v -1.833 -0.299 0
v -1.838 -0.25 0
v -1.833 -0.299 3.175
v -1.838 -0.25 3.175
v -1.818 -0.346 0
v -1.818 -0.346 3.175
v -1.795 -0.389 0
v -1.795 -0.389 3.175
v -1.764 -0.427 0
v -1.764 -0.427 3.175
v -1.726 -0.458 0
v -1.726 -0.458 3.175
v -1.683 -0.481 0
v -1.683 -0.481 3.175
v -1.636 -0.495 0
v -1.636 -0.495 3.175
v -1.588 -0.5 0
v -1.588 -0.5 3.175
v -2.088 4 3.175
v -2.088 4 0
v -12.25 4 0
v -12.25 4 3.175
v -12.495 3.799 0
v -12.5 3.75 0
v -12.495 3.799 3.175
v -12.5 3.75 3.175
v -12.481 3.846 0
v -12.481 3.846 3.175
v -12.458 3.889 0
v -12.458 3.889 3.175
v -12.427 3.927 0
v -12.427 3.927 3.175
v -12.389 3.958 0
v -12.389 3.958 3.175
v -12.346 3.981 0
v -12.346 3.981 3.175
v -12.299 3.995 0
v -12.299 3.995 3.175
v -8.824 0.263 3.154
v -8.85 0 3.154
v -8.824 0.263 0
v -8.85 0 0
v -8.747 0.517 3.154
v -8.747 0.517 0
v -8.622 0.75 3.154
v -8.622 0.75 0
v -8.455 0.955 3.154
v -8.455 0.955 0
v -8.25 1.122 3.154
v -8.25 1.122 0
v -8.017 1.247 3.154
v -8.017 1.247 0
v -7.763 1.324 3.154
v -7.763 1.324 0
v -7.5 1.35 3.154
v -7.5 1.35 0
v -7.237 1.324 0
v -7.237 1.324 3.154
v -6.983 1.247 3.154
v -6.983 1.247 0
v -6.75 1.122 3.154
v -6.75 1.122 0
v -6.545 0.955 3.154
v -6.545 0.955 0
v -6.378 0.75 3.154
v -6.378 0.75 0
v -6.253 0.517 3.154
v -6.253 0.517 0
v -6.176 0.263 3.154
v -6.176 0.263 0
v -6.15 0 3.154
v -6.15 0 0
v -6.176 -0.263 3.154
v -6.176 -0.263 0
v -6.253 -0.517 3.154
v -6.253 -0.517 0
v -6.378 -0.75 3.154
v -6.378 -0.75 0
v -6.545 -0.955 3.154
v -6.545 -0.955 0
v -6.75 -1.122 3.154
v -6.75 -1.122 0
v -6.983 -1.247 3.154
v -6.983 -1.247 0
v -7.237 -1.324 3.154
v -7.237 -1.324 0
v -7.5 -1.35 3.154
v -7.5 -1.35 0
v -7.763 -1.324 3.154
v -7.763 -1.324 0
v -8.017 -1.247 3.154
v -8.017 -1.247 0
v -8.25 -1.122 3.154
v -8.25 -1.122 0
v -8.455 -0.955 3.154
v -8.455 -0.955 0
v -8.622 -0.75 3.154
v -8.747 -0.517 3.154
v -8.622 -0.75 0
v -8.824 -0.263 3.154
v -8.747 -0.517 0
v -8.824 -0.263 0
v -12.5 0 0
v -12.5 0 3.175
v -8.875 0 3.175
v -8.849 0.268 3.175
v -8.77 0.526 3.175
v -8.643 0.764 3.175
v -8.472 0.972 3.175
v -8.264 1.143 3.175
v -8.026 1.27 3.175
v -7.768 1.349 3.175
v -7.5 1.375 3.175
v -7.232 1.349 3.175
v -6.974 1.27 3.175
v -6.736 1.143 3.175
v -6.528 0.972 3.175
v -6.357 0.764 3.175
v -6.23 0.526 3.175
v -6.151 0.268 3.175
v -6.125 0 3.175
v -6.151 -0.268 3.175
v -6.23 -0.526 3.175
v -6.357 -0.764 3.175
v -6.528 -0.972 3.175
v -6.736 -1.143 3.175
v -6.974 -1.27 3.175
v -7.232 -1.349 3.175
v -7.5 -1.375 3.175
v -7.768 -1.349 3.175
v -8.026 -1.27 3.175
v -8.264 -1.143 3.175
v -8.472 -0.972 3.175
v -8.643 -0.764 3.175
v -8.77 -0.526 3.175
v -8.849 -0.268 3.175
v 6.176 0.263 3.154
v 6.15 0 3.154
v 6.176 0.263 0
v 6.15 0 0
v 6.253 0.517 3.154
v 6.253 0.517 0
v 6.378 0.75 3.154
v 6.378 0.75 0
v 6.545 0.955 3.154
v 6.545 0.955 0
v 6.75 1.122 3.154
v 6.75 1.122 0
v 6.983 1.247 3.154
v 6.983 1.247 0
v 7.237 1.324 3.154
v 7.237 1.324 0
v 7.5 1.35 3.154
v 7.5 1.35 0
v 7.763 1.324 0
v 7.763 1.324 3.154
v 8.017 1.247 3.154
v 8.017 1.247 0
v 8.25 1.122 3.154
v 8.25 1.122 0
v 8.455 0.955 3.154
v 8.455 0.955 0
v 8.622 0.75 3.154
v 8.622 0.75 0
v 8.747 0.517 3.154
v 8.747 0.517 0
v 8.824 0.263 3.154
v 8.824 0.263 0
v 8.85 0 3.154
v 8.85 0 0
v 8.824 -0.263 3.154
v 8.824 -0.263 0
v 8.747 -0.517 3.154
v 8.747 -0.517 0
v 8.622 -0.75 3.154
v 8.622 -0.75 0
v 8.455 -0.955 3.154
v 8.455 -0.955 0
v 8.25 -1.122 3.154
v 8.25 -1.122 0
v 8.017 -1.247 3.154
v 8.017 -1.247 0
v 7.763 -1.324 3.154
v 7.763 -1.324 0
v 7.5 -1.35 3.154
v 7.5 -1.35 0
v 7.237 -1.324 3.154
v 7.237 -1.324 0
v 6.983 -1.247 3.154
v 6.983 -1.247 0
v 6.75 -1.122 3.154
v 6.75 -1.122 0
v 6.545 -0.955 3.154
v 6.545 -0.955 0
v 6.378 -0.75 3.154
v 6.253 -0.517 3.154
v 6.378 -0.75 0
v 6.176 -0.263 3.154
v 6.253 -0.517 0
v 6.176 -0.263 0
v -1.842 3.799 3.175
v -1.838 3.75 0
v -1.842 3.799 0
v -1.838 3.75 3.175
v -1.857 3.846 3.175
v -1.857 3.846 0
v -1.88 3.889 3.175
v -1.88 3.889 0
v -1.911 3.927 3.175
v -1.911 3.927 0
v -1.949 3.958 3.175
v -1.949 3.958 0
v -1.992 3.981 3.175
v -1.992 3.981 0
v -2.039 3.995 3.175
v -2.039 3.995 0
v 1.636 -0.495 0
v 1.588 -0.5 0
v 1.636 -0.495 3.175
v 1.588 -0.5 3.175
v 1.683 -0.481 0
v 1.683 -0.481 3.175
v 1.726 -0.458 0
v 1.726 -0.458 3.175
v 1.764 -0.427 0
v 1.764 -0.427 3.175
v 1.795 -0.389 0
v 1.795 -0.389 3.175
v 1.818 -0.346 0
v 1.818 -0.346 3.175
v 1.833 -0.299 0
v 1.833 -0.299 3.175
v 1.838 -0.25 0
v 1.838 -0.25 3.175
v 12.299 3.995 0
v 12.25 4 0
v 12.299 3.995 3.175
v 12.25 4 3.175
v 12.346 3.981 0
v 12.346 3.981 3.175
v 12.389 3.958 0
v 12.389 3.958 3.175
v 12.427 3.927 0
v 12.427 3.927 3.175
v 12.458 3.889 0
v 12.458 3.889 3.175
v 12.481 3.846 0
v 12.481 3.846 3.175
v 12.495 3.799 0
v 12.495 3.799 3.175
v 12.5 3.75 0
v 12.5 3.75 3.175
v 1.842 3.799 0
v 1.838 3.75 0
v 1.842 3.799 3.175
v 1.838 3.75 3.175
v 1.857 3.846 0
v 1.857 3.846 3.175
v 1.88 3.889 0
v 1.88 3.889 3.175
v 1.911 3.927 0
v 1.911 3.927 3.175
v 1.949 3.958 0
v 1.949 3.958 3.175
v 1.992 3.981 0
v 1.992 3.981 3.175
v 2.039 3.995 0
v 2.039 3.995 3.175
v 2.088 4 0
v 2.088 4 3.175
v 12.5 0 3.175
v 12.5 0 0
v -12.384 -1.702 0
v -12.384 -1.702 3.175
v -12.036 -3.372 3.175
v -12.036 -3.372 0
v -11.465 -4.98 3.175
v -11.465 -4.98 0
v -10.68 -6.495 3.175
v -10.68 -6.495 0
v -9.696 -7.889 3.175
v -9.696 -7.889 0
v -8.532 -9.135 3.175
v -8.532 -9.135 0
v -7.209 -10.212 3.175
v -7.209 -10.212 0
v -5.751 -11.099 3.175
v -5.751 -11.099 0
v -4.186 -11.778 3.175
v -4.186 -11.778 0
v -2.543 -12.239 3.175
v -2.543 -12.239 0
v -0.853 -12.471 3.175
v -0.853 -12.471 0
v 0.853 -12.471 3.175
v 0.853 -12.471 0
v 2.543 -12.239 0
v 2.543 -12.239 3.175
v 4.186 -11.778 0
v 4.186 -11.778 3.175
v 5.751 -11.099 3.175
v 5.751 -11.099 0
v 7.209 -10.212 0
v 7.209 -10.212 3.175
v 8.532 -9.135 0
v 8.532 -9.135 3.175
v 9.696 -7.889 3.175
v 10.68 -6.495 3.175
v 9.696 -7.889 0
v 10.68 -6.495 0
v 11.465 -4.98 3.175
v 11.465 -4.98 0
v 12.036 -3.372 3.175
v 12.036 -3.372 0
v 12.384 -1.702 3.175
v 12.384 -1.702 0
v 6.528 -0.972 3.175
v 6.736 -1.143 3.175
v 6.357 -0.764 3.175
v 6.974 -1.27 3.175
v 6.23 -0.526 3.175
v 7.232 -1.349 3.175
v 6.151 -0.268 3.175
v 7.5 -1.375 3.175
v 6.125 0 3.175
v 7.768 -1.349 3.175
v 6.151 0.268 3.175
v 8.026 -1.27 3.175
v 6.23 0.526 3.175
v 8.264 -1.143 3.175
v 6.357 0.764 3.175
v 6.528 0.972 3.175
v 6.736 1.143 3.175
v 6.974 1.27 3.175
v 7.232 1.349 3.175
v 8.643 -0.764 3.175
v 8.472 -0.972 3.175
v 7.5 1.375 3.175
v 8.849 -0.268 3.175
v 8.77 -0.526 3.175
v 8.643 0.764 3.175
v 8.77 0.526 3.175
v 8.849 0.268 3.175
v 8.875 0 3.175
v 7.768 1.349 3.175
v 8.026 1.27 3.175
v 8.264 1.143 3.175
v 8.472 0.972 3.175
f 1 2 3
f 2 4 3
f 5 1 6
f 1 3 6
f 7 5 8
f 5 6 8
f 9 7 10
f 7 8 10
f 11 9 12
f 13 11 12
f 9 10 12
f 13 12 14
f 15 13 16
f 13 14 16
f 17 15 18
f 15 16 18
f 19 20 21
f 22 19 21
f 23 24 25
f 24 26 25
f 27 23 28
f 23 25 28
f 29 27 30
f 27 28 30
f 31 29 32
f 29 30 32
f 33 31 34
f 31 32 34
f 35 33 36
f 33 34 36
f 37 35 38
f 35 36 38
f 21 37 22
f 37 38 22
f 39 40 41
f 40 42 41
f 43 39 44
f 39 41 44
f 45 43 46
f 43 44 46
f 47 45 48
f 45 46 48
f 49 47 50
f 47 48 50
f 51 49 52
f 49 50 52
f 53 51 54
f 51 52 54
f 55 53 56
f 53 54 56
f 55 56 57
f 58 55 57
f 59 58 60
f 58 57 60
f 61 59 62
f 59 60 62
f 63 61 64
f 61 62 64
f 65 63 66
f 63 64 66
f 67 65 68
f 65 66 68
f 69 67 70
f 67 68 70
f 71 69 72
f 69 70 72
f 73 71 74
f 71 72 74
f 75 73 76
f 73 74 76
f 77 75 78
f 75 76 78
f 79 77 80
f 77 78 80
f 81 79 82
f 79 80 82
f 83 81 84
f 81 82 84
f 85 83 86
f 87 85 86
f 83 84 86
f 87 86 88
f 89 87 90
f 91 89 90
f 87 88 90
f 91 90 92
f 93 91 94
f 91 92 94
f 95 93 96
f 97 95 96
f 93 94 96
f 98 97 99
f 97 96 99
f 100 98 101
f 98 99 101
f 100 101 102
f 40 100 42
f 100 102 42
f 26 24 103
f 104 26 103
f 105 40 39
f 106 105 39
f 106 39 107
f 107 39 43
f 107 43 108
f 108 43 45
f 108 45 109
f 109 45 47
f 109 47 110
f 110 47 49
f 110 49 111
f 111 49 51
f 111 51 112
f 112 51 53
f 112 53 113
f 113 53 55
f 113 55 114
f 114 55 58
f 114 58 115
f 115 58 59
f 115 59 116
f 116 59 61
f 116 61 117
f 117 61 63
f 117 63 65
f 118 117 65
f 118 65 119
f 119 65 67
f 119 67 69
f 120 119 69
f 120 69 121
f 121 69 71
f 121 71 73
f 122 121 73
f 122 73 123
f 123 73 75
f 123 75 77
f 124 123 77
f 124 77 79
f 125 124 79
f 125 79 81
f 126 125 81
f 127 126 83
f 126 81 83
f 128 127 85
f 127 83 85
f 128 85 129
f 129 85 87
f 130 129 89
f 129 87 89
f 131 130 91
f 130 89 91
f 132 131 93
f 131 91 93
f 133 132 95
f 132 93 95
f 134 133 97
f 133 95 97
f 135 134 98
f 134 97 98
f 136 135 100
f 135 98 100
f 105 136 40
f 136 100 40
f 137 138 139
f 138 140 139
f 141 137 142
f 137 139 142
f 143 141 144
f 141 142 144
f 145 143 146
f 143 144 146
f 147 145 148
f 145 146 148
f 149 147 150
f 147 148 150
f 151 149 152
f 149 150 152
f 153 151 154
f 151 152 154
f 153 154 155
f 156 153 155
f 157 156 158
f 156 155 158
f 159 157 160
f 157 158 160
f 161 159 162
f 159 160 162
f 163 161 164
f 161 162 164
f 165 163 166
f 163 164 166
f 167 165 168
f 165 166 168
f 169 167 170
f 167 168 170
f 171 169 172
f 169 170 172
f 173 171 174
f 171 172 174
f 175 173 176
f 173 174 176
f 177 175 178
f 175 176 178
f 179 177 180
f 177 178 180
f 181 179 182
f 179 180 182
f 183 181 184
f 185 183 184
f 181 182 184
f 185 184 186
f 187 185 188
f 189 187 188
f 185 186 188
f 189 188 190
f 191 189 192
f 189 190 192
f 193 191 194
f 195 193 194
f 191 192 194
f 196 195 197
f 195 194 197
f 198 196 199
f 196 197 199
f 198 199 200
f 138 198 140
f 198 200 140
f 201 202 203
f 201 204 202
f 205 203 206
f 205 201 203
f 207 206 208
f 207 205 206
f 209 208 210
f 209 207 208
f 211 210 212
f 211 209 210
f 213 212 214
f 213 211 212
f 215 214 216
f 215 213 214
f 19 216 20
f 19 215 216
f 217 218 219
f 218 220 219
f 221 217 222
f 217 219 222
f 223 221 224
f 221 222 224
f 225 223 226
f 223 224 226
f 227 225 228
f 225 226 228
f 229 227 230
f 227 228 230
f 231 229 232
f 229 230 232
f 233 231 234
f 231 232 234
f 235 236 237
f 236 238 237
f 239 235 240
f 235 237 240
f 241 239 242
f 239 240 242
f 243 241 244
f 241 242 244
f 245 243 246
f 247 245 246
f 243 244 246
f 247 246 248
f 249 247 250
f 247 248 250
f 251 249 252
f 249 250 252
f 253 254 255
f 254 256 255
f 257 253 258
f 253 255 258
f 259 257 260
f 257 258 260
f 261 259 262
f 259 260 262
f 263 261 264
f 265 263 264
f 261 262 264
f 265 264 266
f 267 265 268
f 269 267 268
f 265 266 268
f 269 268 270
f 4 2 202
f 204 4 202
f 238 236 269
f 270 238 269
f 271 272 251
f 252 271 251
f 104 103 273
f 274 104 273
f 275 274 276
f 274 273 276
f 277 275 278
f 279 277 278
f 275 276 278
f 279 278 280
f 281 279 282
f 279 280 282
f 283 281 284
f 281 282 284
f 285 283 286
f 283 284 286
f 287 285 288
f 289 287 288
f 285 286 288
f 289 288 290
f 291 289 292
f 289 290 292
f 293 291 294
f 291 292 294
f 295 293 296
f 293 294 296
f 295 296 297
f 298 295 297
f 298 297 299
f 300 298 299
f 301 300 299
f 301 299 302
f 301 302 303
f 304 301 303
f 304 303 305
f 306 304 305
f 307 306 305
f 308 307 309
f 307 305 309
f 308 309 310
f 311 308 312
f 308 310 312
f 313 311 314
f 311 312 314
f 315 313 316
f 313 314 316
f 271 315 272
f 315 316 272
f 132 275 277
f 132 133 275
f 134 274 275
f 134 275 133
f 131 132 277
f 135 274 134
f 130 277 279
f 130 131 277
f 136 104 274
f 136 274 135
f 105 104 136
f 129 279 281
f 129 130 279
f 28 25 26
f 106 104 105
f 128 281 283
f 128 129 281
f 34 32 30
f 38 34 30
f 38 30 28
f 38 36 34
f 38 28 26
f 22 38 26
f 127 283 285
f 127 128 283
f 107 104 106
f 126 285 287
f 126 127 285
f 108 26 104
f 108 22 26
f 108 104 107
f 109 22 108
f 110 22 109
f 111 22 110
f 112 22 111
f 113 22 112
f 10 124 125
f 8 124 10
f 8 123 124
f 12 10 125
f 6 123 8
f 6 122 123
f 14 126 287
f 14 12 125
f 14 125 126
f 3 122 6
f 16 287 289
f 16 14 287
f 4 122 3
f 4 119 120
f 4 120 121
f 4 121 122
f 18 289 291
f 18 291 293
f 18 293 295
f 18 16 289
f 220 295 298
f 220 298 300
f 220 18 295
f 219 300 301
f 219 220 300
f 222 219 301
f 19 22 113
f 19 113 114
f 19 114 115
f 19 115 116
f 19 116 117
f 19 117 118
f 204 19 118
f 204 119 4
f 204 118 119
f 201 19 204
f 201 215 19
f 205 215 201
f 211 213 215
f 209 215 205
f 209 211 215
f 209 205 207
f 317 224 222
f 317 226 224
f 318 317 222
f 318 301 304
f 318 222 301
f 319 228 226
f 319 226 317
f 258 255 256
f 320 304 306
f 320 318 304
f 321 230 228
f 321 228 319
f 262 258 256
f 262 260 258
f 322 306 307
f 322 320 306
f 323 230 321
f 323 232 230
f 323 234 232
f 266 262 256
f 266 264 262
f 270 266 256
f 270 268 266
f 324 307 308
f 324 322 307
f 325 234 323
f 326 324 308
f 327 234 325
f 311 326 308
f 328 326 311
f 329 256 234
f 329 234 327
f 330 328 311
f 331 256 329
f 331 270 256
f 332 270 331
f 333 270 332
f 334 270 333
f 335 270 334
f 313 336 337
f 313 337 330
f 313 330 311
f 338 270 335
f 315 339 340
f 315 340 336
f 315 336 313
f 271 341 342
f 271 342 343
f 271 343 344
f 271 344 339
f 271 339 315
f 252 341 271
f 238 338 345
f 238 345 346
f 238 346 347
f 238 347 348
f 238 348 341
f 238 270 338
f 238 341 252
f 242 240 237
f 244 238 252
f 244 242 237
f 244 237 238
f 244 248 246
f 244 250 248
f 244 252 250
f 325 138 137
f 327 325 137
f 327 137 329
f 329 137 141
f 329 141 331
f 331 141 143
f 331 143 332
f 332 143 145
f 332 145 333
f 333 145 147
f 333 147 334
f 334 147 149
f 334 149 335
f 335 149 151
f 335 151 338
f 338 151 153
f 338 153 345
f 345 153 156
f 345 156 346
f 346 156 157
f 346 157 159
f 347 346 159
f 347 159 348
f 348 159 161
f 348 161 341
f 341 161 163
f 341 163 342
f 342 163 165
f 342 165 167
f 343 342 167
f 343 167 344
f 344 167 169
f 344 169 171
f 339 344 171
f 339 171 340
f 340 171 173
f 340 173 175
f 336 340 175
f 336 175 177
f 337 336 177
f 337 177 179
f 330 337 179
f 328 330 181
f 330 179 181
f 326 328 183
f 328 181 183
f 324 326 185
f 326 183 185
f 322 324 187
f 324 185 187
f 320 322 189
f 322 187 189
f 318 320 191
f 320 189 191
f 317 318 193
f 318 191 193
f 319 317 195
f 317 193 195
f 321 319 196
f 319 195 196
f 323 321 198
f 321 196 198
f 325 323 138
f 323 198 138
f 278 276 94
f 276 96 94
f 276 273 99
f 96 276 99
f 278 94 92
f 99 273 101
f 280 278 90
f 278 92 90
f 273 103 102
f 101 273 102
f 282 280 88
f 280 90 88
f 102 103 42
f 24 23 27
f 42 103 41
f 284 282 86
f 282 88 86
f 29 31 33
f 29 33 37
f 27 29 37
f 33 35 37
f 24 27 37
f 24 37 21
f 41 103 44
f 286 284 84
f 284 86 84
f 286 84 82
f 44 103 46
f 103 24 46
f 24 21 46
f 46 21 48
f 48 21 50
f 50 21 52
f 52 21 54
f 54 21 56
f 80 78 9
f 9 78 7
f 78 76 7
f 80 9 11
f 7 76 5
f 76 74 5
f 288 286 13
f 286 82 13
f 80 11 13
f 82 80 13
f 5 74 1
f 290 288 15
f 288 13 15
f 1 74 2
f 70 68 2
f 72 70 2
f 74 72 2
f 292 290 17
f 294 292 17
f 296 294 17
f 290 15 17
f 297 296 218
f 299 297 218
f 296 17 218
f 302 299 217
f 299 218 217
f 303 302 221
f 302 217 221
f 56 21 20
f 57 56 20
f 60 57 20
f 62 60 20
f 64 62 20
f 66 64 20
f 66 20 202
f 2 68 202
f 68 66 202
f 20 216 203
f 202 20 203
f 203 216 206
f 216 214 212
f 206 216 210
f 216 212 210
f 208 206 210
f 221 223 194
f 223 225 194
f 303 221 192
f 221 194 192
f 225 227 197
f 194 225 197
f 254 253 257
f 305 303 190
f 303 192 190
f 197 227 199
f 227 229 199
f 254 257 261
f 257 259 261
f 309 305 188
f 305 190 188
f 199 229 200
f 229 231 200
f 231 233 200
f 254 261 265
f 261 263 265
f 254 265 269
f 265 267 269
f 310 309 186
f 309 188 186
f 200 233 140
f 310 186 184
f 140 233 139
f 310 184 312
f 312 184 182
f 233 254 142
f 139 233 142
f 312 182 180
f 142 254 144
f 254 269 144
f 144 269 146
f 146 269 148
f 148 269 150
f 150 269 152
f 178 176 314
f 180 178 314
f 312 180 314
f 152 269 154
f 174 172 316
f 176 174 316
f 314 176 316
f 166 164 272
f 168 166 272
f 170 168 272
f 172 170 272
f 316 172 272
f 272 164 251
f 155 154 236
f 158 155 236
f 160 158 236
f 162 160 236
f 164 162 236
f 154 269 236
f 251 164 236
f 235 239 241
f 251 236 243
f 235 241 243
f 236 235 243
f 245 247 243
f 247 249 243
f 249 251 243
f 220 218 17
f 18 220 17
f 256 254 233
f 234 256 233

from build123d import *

# Parameters (mm, degrees)
BOSS_EXTRUDE1_DEPTH              = 3.175
M2_5_CLEARANCE_HOLE1_D           = 2.7
M2_5_CLEARANCE_HOLE1_CSINK_D     = 2.75
M2_5_CLEARANCE_HOLE1_CSINK_ANGLE = 100
FILLET1_R                        = 0.25


with BuildPart() as part:
    # Sketch1 → Boss-Extrude1 (new body)
    with BuildSketch(Plane.XY):
        with BuildLine():
            Line((-12.5, 4), (-12.5, 0))
            ThreePointArc((-12.5, 0), (0, -12.5), (12.5, 0))
            Line((12.5, 0), (12.5, 4))
            Line((12.5, 4), (1.8375, 4))
            Line((1.8375, 4), (1.8375, -0.5))
            Line((1.8375, -0.5), (-1.8375, -0.5))
            Line((-1.8375, -0.5), (-1.8375, 4))
            Line((-1.8375, 4), (-12.5, 4))
        make_face()
    extrude(amount=BOSS_EXTRUDE1_DEPTH)

    # M2.5 Clearance Hole1 (through all)
    with Locations(Plane.XY.offset(3.175)):
        with Locations((-7.5, 0), (7.5, 0)):
            CounterSinkHole(M2_5_CLEARANCE_HOLE1_D / 2, M2_5_CLEARANCE_HOLE1_CSINK_D / 2, counter_sink_angle=M2_5_CLEARANCE_HOLE1_CSINK_ANGLE)

    # Fillet1
    fillet1_edges = [part.edges().sort_by_distance(p)[0] for p in [
        (-12.5, 4, 1.5875),
        (-1.8375, 4, 1.5875),
        (-1.8375, -0.5, 1.5875),
        (1.8375, -0.5, 1.5875),
        (1.8375, 4, 1.5875),
        (12.5, 4, 1.5875),
    ]]
    fillet(fillet1_edges, radius=FILLET1_R)


solid = part.part
